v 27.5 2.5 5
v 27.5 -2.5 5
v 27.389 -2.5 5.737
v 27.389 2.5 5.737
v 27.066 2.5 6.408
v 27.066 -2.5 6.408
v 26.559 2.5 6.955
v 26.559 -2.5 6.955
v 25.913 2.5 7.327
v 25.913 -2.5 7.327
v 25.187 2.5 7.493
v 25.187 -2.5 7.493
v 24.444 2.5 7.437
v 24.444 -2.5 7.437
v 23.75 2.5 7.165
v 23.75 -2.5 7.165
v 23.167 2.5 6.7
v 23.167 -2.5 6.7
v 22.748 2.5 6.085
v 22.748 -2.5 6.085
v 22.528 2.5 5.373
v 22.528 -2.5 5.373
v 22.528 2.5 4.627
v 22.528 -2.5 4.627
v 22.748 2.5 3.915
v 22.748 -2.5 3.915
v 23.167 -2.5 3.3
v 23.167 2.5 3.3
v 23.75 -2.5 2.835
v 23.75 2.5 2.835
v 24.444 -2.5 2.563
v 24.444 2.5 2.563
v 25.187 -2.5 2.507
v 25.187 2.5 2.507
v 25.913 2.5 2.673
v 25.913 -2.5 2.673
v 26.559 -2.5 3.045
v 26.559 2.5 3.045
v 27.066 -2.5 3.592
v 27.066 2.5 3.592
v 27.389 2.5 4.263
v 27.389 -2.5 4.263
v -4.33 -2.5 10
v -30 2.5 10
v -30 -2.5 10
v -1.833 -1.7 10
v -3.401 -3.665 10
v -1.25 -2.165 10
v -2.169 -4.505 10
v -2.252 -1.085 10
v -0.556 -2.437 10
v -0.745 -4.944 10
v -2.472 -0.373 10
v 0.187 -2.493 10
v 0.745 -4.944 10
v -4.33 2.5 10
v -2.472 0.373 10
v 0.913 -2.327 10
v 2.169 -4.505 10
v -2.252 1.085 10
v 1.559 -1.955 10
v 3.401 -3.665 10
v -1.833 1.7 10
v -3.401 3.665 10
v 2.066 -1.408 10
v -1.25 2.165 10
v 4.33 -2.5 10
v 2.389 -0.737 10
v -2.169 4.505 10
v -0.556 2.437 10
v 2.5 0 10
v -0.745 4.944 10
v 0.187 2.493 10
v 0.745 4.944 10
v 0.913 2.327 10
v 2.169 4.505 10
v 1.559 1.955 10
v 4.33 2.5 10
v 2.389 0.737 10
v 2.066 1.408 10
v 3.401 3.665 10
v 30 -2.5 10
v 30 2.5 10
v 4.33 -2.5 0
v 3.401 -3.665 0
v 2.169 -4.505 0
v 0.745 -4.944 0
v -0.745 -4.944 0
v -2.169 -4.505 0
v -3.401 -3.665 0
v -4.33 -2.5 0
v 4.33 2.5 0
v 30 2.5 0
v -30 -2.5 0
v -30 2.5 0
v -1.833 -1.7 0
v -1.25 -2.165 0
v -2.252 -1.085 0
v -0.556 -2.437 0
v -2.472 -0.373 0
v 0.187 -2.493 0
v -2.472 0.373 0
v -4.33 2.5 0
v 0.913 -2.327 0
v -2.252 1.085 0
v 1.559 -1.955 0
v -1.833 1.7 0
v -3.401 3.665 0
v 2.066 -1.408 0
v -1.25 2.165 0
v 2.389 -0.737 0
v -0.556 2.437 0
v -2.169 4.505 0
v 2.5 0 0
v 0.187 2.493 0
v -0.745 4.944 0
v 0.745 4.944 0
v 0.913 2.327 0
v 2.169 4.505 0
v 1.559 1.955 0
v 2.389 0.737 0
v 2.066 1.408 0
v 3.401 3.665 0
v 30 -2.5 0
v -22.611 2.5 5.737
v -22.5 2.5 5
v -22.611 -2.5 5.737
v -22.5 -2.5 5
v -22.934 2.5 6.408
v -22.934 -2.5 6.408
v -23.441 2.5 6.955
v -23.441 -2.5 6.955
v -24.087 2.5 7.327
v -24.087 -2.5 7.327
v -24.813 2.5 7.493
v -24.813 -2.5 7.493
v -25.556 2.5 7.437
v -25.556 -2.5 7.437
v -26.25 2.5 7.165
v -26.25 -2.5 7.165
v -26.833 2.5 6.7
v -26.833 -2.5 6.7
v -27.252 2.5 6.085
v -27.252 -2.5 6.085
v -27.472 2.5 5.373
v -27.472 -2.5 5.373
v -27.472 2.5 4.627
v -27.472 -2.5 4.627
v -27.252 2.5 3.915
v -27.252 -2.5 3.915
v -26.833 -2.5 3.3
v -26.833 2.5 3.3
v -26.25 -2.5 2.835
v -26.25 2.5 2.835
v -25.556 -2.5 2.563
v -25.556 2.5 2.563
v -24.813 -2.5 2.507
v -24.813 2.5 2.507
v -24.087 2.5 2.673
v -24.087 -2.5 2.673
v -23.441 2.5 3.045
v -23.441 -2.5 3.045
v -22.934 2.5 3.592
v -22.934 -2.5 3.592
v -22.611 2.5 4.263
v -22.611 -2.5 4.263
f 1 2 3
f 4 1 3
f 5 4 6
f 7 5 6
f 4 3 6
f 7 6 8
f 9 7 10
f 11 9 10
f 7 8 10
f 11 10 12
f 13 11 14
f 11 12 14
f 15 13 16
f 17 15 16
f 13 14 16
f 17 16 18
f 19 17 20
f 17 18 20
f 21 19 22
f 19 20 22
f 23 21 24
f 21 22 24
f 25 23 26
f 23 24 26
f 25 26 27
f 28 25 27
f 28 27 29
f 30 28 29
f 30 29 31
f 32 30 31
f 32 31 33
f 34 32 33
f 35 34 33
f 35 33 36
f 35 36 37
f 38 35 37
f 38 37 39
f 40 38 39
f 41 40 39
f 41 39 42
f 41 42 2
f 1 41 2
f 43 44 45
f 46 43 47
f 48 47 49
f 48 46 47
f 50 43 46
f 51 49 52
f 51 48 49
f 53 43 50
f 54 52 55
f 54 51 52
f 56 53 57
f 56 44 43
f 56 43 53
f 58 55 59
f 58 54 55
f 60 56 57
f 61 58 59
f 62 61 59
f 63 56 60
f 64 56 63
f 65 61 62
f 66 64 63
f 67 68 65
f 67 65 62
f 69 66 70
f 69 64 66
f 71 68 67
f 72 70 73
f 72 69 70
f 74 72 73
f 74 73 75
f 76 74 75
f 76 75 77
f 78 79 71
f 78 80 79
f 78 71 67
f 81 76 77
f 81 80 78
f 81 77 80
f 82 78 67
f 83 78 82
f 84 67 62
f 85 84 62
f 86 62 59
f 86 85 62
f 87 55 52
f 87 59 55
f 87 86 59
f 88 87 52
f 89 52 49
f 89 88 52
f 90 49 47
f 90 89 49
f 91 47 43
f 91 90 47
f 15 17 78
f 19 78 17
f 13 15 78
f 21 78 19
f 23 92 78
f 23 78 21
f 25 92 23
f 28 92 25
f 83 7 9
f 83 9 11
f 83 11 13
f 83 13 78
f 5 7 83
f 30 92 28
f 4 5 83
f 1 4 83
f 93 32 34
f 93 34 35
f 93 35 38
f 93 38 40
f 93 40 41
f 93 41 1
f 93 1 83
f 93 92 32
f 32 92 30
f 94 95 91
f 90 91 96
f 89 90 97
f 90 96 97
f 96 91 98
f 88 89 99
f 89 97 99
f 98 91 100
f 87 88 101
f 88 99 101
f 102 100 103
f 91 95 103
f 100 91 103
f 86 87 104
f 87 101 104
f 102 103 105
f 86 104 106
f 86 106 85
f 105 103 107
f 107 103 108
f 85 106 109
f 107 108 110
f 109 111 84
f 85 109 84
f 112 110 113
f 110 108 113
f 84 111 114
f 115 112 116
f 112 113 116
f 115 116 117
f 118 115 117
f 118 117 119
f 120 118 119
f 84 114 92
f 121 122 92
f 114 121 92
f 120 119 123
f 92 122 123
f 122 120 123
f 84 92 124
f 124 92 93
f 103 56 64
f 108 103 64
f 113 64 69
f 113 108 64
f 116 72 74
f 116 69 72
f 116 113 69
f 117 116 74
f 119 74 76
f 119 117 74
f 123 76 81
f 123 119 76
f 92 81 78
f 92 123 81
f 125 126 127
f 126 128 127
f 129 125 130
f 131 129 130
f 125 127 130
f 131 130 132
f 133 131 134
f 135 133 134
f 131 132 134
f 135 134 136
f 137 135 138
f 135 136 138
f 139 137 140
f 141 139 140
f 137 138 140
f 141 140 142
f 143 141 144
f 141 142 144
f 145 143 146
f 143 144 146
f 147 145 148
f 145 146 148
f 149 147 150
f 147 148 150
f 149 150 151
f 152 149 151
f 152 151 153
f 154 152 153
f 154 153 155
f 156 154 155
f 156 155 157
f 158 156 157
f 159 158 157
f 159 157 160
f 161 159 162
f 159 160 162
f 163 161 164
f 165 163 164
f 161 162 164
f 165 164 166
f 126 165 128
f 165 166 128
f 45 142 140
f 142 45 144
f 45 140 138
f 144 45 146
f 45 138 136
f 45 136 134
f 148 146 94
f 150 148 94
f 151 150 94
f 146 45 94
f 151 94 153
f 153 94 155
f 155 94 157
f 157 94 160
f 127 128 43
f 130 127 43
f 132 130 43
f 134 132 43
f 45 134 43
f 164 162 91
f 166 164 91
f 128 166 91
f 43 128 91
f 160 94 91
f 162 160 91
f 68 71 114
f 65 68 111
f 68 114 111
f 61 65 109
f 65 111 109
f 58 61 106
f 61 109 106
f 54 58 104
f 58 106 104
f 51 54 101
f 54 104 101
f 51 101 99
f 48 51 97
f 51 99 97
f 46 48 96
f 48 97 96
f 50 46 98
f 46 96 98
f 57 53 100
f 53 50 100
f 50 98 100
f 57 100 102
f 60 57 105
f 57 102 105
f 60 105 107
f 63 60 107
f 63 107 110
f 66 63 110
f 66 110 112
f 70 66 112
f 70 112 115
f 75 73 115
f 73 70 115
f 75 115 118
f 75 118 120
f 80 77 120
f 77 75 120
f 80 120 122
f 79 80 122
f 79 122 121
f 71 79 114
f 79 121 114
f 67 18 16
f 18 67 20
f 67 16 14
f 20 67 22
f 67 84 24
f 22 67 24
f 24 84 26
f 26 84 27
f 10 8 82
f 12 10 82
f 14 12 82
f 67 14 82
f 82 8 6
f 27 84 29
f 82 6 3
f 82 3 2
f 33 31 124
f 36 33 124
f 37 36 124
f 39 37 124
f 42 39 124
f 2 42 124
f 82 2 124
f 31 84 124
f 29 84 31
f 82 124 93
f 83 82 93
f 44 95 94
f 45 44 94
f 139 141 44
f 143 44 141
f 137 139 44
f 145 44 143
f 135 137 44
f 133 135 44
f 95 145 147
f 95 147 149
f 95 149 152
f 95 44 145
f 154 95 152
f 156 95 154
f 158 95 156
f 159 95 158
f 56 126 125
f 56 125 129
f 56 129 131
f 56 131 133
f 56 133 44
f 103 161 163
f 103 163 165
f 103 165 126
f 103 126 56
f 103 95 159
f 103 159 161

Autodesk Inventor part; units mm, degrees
ref_plane "YZ Plane" through (0, 0, 0) normal (1, 0, 0) x (0, 1, 0)
ref_plane "XZ Plane" through (0, 0, 0) normal (0, 1, 0) x (-1, 0, 0)
ref_plane "XY Plane" through (0, 0, 0) normal (0, 0, 1) x (1, 0, 0)
sketch "Sketch1" plane through (0, 0, 0) normal (0, 0, 1) x (1, 0, 0)
  circle A0 centre (0, 0) radius 2.5
  circle A1 centre (0, 0) radius 5
  line L0 (-30, 2.5) -> (30, 2.5)
  line L1 (-30, -2.5) -> (30, -2.5)
  line L2 (30, -2.5) -> (30, 2.5)
  line L3 (-30, 2.5) -> (-30, -2.5)
  dimension "d0" = 5
  dimension "d1" = 10
  dimension "d2" = 5
  dimension "d3" = 2.5
  dimension "d4" = 60
  dimension "d5" = 30
extrude "Extrusion1" add sketch "Sketch1" along normal blind 10 contours A0 L0 A1 L1 | A0 L1 A1 L0 | L0 A1 | L1 A1 | A1 L1 L3 L0 | L0 L2 L1 A1
sketch "Sketch2" plane through (4.3301, -2.5, 0) normal (0, -1, 0) x (1, 0, 0)
  line L0 (-8.6603, 10) -> (-8.6603, 0) projected
  line L1 (-34.3301, 10) -> (-8.6603, 10) projected
  line L2 (-34.3301, 0) -> (-34.3301, 10) projected
  line L3 (-8.6603, 0) -> (-34.3301, 0) projected
  line L4 (0, 0) -> (0, 10) projected
  line L5 (25.6699, 0) -> (0, 0) projected
  line L6 (25.6699, 0) -> (25.6699, 10) projected
  line L7 (0, 10) -> (25.6699, 10) projected
  circle A0 centre (-29.3301, 5) radius 2.5
  circle A1 centre (20.6699, 5) radius 2.5
  point P0 (-4.3301, 0)
  dimension "d8" = 5
  dimension "d9" = 5
  dimension "d10" = 5
  dimension "d11" = 5
  dimension "d12" = 5
  dimension "d13" = 5
extrude "Extrusion2" cut sketch "Sketch2" against normal blind 10 contours A0 | A1
properties part number "Y_Rail_Alignement _Connector_SquareBar-Rev3"
